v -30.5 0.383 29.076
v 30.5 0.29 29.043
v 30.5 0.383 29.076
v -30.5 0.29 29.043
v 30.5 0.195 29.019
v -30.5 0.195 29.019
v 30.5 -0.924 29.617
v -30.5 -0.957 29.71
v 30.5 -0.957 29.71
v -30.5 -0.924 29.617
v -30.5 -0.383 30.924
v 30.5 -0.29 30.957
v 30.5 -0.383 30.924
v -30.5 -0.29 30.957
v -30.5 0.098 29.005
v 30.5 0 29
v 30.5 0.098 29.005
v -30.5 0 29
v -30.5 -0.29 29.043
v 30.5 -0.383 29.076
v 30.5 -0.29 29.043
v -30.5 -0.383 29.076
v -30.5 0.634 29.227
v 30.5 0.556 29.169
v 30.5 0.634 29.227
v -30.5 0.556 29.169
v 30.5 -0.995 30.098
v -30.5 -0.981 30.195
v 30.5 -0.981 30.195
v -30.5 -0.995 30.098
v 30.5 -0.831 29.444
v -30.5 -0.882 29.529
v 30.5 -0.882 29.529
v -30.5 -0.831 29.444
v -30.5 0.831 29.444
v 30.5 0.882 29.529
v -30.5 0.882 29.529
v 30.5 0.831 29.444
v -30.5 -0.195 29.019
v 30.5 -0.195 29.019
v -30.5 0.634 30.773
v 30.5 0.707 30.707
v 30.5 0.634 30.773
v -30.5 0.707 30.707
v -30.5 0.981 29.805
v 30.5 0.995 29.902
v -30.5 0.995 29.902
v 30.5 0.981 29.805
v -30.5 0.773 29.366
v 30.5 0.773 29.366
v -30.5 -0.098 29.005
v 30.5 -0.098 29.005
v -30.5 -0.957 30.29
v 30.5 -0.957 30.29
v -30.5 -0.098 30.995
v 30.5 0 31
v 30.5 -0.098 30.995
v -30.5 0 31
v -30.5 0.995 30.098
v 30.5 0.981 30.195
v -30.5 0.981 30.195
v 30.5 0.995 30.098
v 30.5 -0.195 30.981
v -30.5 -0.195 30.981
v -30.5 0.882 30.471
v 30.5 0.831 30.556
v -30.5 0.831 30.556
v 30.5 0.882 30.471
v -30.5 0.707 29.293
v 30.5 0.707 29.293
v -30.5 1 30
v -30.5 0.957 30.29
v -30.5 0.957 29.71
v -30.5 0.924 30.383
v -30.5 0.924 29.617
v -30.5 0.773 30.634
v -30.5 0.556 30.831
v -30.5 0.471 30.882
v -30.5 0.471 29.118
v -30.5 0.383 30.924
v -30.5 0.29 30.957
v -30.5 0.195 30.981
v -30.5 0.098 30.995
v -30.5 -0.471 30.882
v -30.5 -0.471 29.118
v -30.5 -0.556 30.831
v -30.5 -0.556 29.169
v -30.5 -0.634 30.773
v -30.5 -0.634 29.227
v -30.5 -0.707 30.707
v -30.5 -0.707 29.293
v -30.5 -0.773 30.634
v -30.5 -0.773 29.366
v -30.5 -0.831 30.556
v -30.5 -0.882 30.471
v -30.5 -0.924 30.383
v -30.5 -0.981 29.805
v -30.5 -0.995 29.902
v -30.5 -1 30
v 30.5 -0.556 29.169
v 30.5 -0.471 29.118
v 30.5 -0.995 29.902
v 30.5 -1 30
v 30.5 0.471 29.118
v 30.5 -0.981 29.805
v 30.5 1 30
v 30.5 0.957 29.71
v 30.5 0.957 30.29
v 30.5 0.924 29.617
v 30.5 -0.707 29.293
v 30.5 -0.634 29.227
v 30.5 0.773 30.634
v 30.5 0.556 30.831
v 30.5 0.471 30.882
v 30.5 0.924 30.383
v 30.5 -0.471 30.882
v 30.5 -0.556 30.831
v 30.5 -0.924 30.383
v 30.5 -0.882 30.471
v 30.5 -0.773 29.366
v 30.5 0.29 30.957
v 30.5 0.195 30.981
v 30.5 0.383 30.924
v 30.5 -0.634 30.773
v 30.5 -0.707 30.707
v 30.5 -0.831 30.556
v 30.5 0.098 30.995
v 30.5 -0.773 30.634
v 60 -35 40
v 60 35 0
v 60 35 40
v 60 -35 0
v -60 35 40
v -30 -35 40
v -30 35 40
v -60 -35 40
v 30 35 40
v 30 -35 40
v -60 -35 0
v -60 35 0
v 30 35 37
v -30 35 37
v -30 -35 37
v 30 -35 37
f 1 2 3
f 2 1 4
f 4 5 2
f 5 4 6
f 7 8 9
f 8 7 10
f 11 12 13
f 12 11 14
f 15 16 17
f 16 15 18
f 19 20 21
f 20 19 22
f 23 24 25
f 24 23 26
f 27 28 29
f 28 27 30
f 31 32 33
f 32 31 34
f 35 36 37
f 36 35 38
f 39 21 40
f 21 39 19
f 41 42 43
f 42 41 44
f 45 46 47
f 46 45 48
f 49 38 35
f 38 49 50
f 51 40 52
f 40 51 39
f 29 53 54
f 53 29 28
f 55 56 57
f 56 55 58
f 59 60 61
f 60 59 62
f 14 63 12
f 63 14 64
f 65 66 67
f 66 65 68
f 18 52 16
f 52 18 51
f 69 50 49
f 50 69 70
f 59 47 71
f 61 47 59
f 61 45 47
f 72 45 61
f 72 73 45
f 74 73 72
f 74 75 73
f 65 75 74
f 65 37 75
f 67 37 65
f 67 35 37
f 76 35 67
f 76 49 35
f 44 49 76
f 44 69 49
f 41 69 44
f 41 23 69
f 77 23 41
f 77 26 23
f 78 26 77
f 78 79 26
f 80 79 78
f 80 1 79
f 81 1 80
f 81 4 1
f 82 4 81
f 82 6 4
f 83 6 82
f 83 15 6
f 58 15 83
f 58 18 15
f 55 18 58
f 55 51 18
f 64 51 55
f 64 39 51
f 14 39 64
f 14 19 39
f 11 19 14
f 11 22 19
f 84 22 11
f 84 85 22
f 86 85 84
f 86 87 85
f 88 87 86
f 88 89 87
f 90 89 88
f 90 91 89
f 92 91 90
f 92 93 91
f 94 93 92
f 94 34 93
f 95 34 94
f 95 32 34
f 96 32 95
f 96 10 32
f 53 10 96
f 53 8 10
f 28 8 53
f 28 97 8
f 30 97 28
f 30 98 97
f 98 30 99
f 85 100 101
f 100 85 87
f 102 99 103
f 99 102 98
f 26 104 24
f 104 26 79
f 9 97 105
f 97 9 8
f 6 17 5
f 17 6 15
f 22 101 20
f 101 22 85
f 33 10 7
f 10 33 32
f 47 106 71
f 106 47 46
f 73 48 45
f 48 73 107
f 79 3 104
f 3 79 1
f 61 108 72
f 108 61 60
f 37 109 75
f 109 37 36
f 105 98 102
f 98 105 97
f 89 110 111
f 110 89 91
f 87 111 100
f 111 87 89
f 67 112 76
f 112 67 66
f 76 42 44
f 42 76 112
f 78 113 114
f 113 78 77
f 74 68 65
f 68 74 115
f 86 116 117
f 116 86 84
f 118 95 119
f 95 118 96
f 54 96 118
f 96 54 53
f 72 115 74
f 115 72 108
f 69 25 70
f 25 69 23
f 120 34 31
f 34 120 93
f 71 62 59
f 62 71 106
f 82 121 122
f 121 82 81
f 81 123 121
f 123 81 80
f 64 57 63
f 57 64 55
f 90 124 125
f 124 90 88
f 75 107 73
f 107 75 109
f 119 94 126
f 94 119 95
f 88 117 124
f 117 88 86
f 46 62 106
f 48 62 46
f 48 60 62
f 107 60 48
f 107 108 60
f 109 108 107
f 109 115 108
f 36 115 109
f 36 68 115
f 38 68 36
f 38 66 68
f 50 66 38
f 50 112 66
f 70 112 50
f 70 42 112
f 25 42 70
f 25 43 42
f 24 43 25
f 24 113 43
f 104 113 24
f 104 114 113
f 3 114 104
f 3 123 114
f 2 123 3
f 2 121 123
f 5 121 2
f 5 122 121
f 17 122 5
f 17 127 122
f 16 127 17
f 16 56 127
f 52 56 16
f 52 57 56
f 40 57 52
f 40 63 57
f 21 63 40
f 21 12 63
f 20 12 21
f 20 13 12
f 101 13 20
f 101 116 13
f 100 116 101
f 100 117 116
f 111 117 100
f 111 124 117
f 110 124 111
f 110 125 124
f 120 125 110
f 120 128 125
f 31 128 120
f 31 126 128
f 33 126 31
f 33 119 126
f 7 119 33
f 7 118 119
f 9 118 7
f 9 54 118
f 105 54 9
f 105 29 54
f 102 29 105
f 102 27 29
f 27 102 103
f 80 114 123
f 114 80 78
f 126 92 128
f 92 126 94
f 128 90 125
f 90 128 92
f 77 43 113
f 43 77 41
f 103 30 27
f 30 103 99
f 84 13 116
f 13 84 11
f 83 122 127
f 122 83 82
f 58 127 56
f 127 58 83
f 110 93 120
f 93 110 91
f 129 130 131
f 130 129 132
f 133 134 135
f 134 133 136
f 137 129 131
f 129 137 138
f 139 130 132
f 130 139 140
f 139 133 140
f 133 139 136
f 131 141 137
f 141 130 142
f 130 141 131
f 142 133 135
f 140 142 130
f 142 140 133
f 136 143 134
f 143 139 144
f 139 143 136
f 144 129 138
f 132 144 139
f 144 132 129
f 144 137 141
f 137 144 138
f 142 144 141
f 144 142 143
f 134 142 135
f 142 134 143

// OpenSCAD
// Buffer tank for mini horizontal gel-electrophoresis box
// Print orientation: open top facing up, resting on XY plane at z = 0

// ---------- Parameters ----------
tank_x      = 120;   // outer length in X
tank_y      = 70;    // outer width in Y
tank_h      = 40;    // outer height in Z
wall        = 3;     // wall thickness
floor       = 3;     // floor thickness
platform_x  = 60;    // platform length in X (centred)
platform_y  = tank_y; // platform spans full inner width
platform_top = 13;   // platform top height above tank floor (z = 13)
hole_d      = 2;     // electrode hole diameter
y_hole      = 0;     // electrode hole Y position
z_hole      = 30;    // electrode hole Z position
eps         = 0.5;   // cutter overshoot past faces

$fn = 64;

// ---------- Derived ----------
inner_h   = tank_h - floor - wall;              // 34 mm inner height
wall_t    = tank_x - platform_x;                // end wall thickness (30 mm)

// ---------- Model ----------
difference() {
    // Main tank body
    translate([-tank_x/2, -tank_y/2, 0])
        cube([tank_x, tank_y, tank_h]);

    // Raised platform for gel tray
    translate([-platform_x/2, -platform_y/2, tank_h - floor - wall + floor])
        cube([platform_x, platform_y, platform_top]);

    // Horizontal electrode holes through each end wall
    for (sx = [-1, 1])
        translate([sx > 0 ? tank_x/2 - wall_t : -tank_x/2 + wall_t, y_hole, z_hole])
            rotate([0, 90, 0])
                cylinder(d = hole_d, h = wall_t + 2*eps, center = true);
}
